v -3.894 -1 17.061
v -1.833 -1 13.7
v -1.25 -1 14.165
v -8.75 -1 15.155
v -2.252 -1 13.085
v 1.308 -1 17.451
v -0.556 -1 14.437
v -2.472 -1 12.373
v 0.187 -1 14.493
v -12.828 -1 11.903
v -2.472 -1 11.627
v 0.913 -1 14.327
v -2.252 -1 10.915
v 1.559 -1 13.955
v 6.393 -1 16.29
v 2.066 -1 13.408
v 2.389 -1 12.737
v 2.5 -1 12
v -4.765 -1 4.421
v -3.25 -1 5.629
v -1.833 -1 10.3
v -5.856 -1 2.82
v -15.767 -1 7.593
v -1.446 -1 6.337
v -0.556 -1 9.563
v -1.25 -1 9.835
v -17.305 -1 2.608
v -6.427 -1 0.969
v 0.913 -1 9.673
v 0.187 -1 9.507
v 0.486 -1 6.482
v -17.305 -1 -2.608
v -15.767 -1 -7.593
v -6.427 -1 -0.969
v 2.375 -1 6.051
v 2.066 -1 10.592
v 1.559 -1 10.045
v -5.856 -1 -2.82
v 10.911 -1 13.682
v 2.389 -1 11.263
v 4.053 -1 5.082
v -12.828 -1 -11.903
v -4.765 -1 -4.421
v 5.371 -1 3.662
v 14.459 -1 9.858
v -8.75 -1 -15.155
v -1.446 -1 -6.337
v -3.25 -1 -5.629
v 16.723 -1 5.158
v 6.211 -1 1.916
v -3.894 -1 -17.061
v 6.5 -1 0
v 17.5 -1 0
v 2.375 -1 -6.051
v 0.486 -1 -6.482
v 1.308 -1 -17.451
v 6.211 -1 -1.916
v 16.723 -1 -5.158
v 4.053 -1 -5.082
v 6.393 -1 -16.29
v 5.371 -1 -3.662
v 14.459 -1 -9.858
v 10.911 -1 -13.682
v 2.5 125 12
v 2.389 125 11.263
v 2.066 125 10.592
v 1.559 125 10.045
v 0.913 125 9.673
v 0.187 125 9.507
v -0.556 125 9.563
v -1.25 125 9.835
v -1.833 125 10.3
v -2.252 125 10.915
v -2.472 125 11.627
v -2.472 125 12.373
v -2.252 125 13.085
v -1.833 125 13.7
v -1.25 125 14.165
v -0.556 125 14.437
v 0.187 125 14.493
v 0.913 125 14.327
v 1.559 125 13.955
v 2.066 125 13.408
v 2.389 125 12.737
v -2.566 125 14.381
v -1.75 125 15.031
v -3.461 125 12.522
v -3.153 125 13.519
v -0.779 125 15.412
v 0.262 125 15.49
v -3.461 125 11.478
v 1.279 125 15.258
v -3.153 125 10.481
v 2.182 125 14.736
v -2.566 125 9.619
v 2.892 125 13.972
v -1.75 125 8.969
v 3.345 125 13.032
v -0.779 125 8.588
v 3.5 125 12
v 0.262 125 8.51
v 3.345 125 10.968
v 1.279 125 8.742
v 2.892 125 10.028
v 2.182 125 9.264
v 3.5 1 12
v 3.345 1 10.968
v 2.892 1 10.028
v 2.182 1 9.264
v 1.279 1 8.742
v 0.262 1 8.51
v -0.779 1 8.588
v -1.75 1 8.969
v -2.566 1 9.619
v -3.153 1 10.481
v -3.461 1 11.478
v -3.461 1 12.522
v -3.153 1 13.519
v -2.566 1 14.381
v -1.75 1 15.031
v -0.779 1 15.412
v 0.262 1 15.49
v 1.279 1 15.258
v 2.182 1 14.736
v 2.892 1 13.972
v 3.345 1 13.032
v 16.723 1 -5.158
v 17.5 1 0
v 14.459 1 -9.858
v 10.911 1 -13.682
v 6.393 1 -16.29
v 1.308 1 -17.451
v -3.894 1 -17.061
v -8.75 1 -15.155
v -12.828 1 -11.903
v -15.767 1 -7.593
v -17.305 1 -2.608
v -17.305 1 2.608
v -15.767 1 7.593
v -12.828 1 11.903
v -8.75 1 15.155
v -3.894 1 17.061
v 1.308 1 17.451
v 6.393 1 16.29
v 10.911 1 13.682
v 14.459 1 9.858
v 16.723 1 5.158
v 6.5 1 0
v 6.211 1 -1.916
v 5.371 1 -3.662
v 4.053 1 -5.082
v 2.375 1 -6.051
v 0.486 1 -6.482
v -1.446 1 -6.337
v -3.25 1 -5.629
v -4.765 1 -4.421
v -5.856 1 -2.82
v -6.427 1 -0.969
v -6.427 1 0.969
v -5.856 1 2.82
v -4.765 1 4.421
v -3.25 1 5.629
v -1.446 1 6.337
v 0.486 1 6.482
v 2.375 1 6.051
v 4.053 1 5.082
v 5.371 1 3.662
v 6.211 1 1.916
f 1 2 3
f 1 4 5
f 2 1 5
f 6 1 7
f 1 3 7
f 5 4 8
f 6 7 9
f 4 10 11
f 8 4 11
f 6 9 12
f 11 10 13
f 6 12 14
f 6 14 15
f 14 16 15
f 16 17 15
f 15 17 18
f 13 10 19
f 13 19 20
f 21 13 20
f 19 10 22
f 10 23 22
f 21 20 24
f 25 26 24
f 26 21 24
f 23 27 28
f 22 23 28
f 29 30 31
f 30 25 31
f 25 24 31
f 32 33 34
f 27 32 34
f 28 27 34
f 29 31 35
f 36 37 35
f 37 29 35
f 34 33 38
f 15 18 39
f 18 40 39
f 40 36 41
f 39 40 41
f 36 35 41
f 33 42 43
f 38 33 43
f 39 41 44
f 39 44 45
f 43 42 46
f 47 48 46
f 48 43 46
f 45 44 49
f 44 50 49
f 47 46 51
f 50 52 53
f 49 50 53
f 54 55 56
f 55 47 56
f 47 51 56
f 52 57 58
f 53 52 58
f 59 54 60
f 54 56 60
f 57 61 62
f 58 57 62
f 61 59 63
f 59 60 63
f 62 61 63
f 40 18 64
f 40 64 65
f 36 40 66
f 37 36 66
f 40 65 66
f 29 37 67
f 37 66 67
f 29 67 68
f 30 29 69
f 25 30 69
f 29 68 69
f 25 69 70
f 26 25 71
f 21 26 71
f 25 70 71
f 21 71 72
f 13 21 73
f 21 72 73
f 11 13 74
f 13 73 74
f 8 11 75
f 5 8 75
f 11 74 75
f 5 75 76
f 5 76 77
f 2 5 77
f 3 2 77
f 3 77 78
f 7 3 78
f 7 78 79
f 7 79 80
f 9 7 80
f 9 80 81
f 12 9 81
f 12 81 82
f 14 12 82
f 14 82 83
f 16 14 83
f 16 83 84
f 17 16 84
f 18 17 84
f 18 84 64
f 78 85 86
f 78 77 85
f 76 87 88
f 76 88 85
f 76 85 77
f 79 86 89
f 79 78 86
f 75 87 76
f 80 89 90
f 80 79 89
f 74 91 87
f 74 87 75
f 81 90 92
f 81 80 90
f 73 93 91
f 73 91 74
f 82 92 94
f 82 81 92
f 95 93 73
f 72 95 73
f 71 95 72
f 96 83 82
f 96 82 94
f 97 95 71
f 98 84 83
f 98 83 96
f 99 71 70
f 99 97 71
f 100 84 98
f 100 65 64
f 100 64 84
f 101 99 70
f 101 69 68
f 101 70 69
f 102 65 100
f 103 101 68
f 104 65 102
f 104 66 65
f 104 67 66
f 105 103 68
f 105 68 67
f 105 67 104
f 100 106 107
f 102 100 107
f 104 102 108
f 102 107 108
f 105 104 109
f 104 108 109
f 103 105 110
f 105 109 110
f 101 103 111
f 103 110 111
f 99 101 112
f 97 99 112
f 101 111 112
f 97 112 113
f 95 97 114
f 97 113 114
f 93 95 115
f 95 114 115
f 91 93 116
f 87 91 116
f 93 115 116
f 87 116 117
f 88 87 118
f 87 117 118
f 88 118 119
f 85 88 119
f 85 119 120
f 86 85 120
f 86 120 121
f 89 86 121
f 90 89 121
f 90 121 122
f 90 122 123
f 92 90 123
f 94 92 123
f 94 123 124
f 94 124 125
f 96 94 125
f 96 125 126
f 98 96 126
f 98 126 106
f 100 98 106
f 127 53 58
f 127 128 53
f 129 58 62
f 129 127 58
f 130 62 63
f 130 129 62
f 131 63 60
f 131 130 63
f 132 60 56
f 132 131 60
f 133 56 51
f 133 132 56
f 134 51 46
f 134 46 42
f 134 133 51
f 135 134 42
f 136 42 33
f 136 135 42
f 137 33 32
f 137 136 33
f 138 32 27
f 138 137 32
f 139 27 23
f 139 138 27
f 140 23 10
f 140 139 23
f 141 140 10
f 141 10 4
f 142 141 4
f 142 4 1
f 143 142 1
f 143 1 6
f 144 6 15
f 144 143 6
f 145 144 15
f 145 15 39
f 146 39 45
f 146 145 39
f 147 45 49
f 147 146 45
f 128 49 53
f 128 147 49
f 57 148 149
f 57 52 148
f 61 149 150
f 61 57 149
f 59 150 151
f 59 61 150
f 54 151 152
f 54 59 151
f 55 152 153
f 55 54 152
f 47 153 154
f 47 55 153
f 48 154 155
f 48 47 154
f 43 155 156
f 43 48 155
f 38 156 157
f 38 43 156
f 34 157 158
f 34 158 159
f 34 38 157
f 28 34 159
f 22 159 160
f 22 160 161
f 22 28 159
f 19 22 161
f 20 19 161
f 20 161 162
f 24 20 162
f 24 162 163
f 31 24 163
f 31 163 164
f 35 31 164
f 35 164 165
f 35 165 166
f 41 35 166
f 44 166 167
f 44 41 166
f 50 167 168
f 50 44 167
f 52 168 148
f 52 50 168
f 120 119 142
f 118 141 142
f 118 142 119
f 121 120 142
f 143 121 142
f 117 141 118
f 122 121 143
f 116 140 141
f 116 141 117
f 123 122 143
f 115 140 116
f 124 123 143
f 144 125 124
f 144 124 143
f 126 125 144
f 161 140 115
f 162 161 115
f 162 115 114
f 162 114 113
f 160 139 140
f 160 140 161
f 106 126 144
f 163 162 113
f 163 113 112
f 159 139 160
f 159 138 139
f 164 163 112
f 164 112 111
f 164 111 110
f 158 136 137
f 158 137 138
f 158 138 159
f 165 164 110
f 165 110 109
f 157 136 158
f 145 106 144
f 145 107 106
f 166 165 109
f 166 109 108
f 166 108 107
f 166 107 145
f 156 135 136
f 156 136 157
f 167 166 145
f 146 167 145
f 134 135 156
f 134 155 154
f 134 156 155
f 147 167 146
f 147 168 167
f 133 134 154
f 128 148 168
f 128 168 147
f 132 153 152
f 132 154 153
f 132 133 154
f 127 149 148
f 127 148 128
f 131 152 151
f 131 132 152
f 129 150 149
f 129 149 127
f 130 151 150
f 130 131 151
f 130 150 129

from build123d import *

# Parameters (mm, degrees)
SKETCH2_R          = 17.5
SKETCH2_R_2        = 6.5
PLATE_DEPTH        = 1
SKETCH2_4_R        = 3.5
ROD_DEPTH          = 125
SKETCH3_R          = 2.5
CUT_EXTRUDE1_DEPTH = 127


with BuildPart() as part:
    # Sketch2 → Plate (new body, symmetric)
    with BuildSketch(Plane(origin=(0, 0, 0), x_dir=(1, 0, 0), z_dir=(0, 1, 0))):
        Circle(SKETCH2_R)
        Circle(SKETCH2_R_2, mode=Mode.SUBTRACT)
    extrude(amount=PLATE_DEPTH, both=True)

    # Sketch2<4> → Rod (add)
    with BuildSketch(Plane(origin=(0, 0, 0), x_dir=(1, 0, 0), z_dir=(0, 1, 0))):
        with Locations((0, -12)):
            Circle(SKETCH2_4_R)
    extrude(amount=ROD_DEPTH)

    # Sketch3 → Cut-Extrude1 (cut, through all)
    with BuildSketch(Plane(origin=(0, 125, 0), x_dir=(1, 0, 0), z_dir=(0, 1, 0))):
        with Locations((0, -12)):
            Circle(SKETCH3_R)
    extrude(amount=-CUT_EXTRUDE1_DEPTH, mode=Mode.SUBTRACT)


solid = part.part
